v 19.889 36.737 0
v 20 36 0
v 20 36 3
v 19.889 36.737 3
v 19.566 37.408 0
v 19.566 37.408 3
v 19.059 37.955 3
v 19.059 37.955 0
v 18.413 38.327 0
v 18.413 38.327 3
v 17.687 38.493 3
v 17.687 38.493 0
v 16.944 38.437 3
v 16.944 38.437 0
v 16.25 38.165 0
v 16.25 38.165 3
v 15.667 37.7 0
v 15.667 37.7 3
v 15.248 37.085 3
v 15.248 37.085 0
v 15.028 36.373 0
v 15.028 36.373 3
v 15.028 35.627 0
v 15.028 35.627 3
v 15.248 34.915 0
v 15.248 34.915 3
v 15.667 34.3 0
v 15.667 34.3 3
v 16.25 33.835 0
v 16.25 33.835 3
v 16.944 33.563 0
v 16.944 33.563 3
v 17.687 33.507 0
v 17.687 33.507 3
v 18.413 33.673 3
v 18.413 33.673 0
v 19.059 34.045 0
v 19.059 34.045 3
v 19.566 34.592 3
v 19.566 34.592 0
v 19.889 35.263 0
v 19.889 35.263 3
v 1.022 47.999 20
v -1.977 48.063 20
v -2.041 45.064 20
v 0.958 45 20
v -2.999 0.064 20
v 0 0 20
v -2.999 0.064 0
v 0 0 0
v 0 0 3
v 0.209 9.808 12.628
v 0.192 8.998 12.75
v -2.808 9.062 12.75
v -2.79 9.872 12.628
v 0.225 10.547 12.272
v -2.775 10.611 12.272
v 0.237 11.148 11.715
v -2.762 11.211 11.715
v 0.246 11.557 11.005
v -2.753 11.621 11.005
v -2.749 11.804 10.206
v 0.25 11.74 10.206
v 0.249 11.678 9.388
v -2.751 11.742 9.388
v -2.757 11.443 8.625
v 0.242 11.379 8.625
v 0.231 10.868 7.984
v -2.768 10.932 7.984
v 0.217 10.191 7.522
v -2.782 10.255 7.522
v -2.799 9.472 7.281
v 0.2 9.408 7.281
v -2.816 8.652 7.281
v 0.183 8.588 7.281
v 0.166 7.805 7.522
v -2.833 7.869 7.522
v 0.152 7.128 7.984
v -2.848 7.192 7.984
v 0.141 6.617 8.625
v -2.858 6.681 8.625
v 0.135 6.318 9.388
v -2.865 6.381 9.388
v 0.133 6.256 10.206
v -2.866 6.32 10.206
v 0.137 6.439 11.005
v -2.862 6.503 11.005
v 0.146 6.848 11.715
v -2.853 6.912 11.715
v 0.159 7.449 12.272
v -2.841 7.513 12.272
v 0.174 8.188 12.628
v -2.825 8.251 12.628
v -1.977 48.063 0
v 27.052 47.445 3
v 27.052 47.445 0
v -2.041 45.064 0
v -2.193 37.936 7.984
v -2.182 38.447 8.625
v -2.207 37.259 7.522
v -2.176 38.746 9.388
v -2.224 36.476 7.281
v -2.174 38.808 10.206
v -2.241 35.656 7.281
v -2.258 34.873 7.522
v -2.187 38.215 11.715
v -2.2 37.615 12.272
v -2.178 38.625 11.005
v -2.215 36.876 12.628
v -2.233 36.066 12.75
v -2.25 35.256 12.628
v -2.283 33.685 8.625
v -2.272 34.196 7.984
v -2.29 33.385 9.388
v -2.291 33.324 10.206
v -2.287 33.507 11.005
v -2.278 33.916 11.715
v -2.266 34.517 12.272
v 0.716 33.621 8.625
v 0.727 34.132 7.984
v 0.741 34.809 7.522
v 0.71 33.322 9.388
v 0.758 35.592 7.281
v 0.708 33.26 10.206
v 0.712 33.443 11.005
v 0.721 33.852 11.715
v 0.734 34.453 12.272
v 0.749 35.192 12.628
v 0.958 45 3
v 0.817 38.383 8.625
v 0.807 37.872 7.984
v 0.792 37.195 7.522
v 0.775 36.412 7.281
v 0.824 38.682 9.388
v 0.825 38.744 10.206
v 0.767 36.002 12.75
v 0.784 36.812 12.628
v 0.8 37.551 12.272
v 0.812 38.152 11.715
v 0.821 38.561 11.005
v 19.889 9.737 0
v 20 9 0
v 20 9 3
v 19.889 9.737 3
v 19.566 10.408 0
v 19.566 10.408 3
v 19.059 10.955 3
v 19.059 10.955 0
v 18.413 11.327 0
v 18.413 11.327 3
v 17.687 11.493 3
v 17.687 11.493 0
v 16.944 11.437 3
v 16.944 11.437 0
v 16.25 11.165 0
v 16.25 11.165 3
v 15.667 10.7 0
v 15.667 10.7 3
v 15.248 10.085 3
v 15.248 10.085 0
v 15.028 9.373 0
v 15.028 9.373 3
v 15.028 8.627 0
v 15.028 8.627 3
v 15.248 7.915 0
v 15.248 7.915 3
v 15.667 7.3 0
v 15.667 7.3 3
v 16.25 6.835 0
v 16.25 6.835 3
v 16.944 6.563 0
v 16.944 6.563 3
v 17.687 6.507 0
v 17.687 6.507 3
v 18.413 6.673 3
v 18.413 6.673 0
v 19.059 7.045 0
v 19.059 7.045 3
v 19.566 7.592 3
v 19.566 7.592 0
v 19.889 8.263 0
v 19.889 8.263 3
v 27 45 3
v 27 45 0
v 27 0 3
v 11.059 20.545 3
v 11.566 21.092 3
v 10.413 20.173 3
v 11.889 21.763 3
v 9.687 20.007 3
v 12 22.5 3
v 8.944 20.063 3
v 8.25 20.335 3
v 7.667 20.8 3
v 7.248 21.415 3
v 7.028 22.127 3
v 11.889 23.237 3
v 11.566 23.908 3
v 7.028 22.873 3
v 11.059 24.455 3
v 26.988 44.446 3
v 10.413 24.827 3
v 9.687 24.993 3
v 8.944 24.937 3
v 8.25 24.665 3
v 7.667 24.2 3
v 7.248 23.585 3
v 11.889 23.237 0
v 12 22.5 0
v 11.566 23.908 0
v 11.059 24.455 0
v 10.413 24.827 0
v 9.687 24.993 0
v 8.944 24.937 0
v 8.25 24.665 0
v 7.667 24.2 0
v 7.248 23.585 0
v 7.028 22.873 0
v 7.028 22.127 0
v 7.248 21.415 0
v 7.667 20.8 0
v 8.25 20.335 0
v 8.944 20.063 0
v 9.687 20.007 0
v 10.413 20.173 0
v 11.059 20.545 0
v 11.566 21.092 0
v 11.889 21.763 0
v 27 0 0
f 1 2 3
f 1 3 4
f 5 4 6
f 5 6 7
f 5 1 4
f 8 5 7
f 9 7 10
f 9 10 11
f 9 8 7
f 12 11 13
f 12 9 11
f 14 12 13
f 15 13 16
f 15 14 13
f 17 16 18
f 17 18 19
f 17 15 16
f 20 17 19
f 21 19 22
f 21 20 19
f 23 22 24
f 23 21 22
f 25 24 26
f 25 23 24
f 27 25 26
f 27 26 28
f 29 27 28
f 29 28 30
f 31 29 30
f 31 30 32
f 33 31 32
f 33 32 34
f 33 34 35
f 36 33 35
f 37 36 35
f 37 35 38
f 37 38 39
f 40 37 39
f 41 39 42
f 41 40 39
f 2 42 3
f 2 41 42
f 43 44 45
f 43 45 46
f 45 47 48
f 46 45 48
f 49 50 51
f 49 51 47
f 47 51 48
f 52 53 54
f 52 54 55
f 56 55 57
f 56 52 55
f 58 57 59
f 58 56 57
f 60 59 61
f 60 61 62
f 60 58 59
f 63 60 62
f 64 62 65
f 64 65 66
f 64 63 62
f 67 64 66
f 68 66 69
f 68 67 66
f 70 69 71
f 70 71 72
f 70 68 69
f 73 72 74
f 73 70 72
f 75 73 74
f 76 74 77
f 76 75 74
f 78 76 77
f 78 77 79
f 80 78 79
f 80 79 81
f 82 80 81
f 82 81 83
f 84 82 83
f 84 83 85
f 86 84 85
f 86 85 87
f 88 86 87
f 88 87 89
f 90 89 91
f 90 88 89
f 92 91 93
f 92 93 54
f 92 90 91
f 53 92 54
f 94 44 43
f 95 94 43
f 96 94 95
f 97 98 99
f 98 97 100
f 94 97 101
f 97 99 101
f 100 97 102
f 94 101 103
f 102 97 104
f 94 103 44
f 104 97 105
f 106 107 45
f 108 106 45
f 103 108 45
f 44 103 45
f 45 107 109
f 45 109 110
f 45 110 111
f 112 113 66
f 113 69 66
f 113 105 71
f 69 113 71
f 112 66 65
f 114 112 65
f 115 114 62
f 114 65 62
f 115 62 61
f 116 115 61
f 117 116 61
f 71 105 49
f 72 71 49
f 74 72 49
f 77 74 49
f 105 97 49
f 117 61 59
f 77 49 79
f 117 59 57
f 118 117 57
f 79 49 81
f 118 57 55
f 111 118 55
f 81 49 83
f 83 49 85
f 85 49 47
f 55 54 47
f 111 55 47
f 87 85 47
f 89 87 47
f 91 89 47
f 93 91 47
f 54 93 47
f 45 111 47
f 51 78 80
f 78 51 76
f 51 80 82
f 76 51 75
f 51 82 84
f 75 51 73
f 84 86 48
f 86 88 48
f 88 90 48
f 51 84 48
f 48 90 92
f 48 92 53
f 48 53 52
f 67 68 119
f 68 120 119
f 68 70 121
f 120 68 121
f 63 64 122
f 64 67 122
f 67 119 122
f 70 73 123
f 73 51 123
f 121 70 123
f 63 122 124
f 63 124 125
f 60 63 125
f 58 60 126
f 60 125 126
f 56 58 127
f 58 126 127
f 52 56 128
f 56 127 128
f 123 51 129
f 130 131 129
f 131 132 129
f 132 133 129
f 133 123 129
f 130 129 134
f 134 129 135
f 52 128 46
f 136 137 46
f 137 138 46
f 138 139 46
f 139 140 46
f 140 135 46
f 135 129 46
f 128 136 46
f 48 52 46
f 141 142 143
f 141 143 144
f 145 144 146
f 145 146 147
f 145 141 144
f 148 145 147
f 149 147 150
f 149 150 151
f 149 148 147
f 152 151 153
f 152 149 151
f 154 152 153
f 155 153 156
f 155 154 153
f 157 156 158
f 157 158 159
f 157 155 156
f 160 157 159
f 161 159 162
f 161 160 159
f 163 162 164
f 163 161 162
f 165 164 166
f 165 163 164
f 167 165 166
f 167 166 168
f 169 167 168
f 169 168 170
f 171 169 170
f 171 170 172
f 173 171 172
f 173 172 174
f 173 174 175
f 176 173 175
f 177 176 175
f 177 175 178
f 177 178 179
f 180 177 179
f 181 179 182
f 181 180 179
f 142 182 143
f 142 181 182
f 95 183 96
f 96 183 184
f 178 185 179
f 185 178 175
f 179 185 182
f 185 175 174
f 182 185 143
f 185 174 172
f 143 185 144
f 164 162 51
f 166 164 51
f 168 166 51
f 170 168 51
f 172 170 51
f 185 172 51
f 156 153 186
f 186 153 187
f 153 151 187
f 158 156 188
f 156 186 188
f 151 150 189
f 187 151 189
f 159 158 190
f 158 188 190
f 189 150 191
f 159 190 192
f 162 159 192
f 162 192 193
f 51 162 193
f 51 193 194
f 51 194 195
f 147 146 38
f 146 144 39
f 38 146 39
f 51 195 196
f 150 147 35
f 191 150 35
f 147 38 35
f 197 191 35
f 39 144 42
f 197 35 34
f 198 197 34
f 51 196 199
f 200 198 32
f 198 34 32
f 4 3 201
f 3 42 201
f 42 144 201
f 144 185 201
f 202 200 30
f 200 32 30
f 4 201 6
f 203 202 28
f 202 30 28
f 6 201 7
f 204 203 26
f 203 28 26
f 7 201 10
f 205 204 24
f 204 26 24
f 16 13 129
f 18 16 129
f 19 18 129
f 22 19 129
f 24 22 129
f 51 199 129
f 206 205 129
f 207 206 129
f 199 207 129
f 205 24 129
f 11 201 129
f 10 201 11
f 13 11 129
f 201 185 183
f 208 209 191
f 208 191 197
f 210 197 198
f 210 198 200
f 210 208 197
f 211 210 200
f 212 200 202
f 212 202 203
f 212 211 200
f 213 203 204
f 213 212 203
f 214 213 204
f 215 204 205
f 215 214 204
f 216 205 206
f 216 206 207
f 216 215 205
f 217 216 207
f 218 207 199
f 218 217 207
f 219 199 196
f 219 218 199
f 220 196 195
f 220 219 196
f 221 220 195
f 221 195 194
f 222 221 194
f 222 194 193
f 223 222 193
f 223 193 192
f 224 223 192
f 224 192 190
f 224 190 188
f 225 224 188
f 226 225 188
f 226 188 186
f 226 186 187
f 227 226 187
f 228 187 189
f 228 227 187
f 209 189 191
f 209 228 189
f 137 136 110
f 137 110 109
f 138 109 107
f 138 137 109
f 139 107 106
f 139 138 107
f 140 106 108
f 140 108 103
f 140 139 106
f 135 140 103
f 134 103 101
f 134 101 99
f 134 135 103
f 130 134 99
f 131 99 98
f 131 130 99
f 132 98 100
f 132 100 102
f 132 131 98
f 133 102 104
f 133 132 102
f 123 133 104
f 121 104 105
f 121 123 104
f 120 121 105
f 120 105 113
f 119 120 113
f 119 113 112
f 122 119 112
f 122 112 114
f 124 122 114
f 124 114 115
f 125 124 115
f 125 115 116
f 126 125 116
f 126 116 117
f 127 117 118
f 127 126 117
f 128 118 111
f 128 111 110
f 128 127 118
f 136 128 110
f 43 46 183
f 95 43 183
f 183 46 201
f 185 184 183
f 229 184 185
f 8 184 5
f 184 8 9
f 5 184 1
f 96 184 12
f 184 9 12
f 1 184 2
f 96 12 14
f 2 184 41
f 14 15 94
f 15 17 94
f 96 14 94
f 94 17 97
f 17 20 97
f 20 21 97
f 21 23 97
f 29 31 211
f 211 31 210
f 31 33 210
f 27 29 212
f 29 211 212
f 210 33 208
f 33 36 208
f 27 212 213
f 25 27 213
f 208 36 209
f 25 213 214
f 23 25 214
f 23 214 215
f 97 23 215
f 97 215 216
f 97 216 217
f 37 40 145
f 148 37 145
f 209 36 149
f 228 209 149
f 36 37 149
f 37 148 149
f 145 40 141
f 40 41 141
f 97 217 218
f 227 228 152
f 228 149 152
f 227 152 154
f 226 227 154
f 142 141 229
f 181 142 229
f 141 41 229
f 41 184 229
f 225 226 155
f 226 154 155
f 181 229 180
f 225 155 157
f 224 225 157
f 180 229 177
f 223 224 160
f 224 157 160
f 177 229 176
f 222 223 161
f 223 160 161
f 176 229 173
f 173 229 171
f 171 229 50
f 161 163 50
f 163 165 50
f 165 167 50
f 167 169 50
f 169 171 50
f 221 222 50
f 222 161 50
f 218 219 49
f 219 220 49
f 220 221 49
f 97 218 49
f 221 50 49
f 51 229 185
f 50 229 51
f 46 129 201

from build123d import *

# Parameters (mm, degrees)
SKETCH1_R           = 2.5
BOSS_EXTRUDE1_DEPTH = 3
SKETCH2_W           = 20
SKETCH2_H           = 45.01020326
SKETCH2_R           = 2.75
BOSS_EXTRUDE2_DEPTH = 3
BOSS_EXTRUDE3_DEPTH = 3


with BuildPart() as part:
    # Sketch1 → Boss-Extrude1 (new body)
    with BuildSketch(Plane.XY):
        Polygon((0, 0), (0.958330597, 45), (27, 45), (27, 0), align=None)
        with Locations((17.5, 36)):
            Circle(SKETCH1_R, mode=Mode.SUBTRACT)
        with Locations((17.5, 9)):
            Circle(SKETCH1_R, mode=Mode.SUBTRACT)
        with Locations((9.5, 22.5)):
            Circle(SKETCH1_R, mode=Mode.SUBTRACT)
    extrude(amount=BOSS_EXTRUDE1_DEPTH)

    # Sketch2 → Boss-Extrude2 (add)
    with BuildSketch(Plane(origin=(0, 0, 0), x_dir=(0, 0, 1), z_dir=(-0.999773312, 0.021291408, 0))):
        with Locations((10, 22.50510163)):
            Rectangle(SKETCH2_W, SKETCH2_H)
        with Locations((10, 36.01020326)):
            Circle(SKETCH2_R, mode=Mode.SUBTRACT)
        with Locations((10, 9)):
            Circle(SKETCH2_R, mode=Mode.SUBTRACT)
    extrude(amount=BOSS_EXTRUDE2_DEPTH)

    # Sketch3 → Boss-Extrude3 (add)
    with BuildSketch(Plane(origin=(0.958330597, 45, 0), x_dir=(0.999773312, -0.021291408, 0), z_dir=(0.021291408, 0.999773312, 0))):
        Polygon((0, -20), (26.035766076, -3), (26.035766076, 0), (-3, 0), (-3, -20), align=None)
    extrude(amount=BOSS_EXTRUDE3_DEPTH)


solid = part.part
